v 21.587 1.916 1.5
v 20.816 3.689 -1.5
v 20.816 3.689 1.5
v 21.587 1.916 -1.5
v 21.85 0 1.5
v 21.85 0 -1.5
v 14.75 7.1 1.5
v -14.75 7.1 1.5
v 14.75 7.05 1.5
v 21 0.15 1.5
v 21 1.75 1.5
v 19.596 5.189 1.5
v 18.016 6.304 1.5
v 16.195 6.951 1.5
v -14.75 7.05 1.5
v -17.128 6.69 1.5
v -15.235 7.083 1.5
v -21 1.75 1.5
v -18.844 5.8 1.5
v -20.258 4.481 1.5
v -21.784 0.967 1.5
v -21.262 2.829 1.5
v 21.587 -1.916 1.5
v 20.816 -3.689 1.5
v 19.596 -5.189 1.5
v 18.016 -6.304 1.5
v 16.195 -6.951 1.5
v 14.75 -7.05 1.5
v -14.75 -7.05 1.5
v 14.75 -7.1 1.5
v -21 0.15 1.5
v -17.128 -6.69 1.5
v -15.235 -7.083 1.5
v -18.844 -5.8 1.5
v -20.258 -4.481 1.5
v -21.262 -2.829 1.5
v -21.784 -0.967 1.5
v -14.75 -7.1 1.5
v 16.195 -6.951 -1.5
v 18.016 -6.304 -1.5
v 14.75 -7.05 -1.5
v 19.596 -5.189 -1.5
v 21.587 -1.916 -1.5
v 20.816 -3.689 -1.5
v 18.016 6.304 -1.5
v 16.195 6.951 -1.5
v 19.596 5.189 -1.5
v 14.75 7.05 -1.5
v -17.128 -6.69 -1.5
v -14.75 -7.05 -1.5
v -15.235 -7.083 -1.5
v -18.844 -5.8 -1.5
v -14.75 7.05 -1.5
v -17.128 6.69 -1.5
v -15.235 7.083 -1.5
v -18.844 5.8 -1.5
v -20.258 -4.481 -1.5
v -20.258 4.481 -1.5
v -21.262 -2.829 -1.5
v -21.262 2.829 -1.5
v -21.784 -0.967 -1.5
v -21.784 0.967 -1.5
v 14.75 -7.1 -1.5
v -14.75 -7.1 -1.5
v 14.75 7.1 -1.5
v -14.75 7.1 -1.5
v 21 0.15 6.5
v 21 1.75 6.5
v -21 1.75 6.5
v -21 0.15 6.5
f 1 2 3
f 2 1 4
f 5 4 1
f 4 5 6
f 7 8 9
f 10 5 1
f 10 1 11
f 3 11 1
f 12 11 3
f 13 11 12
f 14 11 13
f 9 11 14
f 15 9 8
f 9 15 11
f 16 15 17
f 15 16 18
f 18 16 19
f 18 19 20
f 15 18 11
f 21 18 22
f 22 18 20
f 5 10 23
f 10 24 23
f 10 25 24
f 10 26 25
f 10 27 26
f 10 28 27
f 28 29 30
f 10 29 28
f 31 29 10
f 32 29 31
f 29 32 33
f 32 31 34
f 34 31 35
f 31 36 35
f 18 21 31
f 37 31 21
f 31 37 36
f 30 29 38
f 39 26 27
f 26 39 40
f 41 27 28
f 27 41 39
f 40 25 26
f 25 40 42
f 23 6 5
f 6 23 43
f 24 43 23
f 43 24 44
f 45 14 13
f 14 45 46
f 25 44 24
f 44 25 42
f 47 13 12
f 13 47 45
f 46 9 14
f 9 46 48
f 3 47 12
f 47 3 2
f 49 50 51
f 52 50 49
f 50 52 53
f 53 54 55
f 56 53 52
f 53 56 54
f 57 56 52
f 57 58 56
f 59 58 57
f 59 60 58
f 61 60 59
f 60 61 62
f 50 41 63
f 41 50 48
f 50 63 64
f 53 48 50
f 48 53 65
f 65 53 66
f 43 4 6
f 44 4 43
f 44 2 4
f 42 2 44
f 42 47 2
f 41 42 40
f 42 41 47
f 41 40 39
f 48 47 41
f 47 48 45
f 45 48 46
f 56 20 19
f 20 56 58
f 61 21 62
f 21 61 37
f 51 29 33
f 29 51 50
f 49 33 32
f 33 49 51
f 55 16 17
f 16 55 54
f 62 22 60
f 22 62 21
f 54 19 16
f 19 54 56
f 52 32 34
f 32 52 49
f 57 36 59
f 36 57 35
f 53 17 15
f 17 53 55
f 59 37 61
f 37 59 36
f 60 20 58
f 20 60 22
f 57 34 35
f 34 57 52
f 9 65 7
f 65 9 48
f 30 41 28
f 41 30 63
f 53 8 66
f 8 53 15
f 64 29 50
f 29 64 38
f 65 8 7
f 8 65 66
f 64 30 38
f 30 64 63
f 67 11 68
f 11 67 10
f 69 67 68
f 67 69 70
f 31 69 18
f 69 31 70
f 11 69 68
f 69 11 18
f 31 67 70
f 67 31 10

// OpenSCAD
// Copyright (c) 2013 Gordon Williams, Pur3 Ltd.
// Copyright (c) 2015 Alexander Brevig. 
// See the file LICENSE for copying permission.
//
// Simple Box cover for espruino_box
// Cover slides in behind the Espruino
// Can be 3D printed on end

/*
Fill in values from your espruino_box print
*/
INNER_RAD = 6.5;
INNER_WIDTH = 42.5;
THICKNESS = 0.6;

/* 
Configure connecting areas 
*/
COVER_THICKNESS = 3;   // the base thickness
CONNECTING_HEIGHT = 5; // you need this amount of space available 
                       // 'behind' your Espruino while it's in its box
CONNECTING_WIDTH = 1.6;// This is calculated from 

// Calculated values, do not manually update unless you have a good reason
END_THICKNESS = THICKNESS + 1.2; 
OUTER_RAD = INNER_RAD + THICKNESS;
OUTER_WIDTH = INNER_WIDTH + THICKNESS*2;

module shape(w,r,l) {
 union() {
  translate([(w/2)-r,0,0]) cylinder(r=r,h=l,center=true);
  translate([r-(w/2),0,0]) cylinder(r=r,h=l,center=true);
  cube([w-r*2,r*2,l], center=true);
 }
}

union(){
 difference() {
  translate([0,0,0]) 
     shape(OUTER_WIDTH, OUTER_RAD, COVER_THICKNESS);
 }
 
 accountForCurve = 0.5;
 translate([0,CONNECTING_WIDTH+THICKNESS/2,COVER_THICKNESS+CONNECTING_HEIGHT]/2) 
    cube([INNER_WIDTH-accountForCurve,CONNECTING_WIDTH,CONNECTING_HEIGHT], center=true);
 
}
